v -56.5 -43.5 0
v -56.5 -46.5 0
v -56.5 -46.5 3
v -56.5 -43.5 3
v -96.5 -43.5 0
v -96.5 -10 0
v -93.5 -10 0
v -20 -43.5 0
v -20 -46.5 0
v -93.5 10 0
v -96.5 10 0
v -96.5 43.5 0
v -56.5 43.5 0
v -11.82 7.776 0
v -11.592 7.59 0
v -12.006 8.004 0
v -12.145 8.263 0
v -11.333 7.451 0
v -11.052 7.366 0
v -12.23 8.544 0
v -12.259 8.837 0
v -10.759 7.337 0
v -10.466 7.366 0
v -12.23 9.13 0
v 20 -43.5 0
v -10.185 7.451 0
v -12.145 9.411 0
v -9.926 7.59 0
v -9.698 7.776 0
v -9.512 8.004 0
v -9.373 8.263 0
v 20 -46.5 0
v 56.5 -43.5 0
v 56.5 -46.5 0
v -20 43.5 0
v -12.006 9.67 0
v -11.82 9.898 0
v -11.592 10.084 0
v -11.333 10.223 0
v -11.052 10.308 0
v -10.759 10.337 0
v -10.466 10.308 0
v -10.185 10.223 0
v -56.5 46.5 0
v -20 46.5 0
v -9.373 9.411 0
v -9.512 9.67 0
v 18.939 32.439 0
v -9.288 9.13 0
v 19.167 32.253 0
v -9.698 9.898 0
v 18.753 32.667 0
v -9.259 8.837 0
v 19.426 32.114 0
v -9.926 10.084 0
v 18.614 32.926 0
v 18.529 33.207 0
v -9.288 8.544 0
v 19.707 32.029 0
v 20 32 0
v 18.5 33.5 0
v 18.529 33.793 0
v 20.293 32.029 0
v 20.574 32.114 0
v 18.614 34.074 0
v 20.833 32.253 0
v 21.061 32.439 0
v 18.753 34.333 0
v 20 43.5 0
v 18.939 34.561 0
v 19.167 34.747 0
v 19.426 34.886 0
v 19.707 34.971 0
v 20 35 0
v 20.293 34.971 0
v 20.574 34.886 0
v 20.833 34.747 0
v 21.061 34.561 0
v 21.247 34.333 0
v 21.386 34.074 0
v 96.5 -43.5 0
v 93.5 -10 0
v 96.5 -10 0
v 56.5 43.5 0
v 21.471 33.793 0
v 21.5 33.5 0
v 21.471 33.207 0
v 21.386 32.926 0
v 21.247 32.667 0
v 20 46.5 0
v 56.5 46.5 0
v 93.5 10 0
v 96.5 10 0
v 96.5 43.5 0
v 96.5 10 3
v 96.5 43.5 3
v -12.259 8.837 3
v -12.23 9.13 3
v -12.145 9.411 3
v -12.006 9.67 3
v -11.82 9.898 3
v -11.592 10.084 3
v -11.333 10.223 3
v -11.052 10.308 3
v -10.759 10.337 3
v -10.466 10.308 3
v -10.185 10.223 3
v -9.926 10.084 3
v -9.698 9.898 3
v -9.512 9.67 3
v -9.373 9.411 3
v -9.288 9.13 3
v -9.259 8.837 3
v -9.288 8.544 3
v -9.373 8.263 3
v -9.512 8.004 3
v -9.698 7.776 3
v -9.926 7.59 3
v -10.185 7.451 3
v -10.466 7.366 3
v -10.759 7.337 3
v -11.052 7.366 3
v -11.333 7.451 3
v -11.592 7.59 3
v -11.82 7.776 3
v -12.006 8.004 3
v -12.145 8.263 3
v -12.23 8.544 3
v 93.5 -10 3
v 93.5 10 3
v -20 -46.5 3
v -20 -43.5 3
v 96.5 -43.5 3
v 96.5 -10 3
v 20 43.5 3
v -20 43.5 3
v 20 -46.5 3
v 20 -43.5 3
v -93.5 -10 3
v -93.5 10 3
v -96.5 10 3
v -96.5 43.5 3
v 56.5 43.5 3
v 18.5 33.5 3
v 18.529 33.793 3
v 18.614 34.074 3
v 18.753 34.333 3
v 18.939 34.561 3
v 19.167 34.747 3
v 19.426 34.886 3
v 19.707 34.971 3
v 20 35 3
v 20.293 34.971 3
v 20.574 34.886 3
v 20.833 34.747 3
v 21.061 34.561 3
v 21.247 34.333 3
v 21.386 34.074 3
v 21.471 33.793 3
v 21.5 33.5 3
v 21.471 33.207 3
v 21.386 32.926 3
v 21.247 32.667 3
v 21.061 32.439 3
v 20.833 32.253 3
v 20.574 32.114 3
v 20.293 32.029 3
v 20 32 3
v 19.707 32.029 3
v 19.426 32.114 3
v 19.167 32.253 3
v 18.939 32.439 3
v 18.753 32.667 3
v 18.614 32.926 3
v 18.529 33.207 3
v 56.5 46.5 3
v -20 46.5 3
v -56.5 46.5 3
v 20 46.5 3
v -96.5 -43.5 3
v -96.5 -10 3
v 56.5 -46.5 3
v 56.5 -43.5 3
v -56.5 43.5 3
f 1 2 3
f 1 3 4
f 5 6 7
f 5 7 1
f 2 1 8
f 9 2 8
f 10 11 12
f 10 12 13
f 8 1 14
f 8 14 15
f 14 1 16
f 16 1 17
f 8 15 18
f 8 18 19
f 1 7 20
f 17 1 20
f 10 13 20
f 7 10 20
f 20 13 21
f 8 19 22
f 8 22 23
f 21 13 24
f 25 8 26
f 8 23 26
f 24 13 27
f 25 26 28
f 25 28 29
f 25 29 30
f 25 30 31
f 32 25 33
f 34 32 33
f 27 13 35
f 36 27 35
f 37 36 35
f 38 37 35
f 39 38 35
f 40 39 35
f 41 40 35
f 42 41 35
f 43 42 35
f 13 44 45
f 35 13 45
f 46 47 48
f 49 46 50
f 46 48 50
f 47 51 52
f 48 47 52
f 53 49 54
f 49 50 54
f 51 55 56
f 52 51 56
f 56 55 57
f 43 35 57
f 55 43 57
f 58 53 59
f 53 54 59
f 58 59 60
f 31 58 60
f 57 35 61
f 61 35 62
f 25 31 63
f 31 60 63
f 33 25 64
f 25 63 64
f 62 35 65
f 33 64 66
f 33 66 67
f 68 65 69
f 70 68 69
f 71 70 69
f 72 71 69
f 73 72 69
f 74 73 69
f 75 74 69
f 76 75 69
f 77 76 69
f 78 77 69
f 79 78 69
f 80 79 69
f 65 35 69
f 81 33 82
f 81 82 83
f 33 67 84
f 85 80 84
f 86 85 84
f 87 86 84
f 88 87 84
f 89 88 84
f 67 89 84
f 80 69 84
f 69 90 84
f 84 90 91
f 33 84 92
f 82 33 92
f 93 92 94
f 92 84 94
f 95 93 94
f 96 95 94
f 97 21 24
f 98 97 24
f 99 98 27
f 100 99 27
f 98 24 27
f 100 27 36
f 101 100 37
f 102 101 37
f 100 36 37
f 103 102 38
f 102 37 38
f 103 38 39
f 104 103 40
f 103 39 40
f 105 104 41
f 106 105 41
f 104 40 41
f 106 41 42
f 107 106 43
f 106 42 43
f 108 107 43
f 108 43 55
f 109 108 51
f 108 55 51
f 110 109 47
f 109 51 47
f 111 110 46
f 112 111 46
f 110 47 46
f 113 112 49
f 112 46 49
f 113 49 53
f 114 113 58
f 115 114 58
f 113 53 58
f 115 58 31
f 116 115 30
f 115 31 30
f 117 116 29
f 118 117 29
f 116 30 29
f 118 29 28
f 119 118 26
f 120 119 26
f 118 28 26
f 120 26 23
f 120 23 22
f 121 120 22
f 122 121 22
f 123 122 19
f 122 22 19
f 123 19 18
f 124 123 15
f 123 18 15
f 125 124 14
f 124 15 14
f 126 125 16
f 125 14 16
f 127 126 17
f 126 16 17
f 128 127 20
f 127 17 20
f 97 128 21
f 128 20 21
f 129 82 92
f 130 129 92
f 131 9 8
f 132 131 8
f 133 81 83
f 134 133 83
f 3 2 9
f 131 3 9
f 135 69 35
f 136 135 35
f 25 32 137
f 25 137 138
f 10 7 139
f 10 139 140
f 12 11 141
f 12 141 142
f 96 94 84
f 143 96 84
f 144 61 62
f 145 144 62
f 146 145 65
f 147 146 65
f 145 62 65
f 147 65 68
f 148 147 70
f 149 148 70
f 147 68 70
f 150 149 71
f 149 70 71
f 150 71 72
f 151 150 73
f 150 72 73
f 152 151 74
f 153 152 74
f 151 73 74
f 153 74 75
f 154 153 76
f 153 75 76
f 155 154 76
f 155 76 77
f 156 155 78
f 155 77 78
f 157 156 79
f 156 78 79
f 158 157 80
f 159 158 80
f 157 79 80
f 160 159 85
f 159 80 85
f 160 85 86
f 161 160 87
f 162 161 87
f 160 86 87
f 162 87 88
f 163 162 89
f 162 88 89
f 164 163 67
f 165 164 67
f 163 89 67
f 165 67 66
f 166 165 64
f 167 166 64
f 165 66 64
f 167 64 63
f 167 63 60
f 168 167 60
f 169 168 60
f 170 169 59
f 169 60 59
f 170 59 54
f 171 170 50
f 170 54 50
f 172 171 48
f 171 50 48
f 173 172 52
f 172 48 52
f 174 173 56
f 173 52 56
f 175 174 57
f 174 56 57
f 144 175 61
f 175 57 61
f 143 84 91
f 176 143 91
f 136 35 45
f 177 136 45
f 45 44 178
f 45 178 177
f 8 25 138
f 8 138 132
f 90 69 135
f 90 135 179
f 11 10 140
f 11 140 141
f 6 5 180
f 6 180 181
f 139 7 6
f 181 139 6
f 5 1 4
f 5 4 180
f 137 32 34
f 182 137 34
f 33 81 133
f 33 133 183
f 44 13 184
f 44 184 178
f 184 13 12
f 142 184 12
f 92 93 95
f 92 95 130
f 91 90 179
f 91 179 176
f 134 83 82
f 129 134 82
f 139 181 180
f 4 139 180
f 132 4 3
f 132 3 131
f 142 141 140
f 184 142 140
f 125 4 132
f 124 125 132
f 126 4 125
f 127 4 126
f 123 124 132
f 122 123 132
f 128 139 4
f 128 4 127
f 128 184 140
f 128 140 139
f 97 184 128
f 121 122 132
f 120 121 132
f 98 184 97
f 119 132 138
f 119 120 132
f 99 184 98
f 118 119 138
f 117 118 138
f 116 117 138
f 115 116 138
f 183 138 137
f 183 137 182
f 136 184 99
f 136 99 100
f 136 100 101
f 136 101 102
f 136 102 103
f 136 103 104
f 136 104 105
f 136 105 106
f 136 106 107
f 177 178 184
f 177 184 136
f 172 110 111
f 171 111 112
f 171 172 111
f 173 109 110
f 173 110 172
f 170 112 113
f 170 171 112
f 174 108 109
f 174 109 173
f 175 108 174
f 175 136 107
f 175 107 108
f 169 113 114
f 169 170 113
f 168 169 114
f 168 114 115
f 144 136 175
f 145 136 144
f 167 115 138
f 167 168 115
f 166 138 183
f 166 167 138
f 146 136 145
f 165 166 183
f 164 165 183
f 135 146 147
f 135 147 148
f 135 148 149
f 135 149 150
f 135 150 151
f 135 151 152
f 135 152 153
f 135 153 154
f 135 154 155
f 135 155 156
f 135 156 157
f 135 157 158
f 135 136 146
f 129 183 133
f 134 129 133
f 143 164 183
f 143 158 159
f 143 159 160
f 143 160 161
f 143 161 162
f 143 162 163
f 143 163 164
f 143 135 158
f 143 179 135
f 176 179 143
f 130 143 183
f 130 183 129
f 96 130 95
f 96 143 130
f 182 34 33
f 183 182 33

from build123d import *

# Parameters (mm, degrees)
SKETCH2_W           = 193
SKETCH2_H           = 93
BOSS_EXTRUDE1_DEPTH = 3
SKETCH3_R           = 1.5
SKETCH3_W           = 40
SKETCH3_H           = 3
SKETCH3_W_2         = 3
SKETCH3_H_2         = 20
CUT_EXTRUDE1_DEPTH  = 3


with BuildPart() as part:
    # Sketch2 → Boss-Extrude1 (new body)
    with BuildSketch(Plane.XY):
        Rectangle(SKETCH2_W, SKETCH2_H)
    extrude(amount=BOSS_EXTRUDE1_DEPTH)

    # Sketch3 → Cut-Extrude1 (cut)
    with BuildSketch(Plane(origin=(0, 0, 0), x_dir=(-1, 0, 0), z_dir=(0, 0, -1))):
        with Locations((-20, 33.5)):
            Circle(SKETCH3_R)
        with Locations((10.759, 8.837)):
            Circle(SKETCH3_R)
        with Locations((-76.5, 45)):
            Rectangle(SKETCH3_W, SKETCH3_H)
        with Locations((76.5, -45)):
            Rectangle(SKETCH3_W, SKETCH3_H)
        with Locations((76.5, 45)):
            Rectangle(SKETCH3_W, SKETCH3_H)
        with Locations((0, 45)):
            Rectangle(SKETCH3_W, SKETCH3_H)
        with Locations((0, -45)):
            Rectangle(SKETCH3_W, SKETCH3_H)
        with Locations((-76.5, -45)):
            Rectangle(SKETCH3_W, SKETCH3_H)
        with Locations((95, 0)):
            Rectangle(SKETCH3_W_2, SKETCH3_H_2)
        with Locations((-95, 0)):
            Rectangle(SKETCH3_W_2, SKETCH3_H_2)
    extrude(amount=-CUT_EXTRUDE1_DEPTH, mode=Mode.SUBTRACT)


solid = part.part
